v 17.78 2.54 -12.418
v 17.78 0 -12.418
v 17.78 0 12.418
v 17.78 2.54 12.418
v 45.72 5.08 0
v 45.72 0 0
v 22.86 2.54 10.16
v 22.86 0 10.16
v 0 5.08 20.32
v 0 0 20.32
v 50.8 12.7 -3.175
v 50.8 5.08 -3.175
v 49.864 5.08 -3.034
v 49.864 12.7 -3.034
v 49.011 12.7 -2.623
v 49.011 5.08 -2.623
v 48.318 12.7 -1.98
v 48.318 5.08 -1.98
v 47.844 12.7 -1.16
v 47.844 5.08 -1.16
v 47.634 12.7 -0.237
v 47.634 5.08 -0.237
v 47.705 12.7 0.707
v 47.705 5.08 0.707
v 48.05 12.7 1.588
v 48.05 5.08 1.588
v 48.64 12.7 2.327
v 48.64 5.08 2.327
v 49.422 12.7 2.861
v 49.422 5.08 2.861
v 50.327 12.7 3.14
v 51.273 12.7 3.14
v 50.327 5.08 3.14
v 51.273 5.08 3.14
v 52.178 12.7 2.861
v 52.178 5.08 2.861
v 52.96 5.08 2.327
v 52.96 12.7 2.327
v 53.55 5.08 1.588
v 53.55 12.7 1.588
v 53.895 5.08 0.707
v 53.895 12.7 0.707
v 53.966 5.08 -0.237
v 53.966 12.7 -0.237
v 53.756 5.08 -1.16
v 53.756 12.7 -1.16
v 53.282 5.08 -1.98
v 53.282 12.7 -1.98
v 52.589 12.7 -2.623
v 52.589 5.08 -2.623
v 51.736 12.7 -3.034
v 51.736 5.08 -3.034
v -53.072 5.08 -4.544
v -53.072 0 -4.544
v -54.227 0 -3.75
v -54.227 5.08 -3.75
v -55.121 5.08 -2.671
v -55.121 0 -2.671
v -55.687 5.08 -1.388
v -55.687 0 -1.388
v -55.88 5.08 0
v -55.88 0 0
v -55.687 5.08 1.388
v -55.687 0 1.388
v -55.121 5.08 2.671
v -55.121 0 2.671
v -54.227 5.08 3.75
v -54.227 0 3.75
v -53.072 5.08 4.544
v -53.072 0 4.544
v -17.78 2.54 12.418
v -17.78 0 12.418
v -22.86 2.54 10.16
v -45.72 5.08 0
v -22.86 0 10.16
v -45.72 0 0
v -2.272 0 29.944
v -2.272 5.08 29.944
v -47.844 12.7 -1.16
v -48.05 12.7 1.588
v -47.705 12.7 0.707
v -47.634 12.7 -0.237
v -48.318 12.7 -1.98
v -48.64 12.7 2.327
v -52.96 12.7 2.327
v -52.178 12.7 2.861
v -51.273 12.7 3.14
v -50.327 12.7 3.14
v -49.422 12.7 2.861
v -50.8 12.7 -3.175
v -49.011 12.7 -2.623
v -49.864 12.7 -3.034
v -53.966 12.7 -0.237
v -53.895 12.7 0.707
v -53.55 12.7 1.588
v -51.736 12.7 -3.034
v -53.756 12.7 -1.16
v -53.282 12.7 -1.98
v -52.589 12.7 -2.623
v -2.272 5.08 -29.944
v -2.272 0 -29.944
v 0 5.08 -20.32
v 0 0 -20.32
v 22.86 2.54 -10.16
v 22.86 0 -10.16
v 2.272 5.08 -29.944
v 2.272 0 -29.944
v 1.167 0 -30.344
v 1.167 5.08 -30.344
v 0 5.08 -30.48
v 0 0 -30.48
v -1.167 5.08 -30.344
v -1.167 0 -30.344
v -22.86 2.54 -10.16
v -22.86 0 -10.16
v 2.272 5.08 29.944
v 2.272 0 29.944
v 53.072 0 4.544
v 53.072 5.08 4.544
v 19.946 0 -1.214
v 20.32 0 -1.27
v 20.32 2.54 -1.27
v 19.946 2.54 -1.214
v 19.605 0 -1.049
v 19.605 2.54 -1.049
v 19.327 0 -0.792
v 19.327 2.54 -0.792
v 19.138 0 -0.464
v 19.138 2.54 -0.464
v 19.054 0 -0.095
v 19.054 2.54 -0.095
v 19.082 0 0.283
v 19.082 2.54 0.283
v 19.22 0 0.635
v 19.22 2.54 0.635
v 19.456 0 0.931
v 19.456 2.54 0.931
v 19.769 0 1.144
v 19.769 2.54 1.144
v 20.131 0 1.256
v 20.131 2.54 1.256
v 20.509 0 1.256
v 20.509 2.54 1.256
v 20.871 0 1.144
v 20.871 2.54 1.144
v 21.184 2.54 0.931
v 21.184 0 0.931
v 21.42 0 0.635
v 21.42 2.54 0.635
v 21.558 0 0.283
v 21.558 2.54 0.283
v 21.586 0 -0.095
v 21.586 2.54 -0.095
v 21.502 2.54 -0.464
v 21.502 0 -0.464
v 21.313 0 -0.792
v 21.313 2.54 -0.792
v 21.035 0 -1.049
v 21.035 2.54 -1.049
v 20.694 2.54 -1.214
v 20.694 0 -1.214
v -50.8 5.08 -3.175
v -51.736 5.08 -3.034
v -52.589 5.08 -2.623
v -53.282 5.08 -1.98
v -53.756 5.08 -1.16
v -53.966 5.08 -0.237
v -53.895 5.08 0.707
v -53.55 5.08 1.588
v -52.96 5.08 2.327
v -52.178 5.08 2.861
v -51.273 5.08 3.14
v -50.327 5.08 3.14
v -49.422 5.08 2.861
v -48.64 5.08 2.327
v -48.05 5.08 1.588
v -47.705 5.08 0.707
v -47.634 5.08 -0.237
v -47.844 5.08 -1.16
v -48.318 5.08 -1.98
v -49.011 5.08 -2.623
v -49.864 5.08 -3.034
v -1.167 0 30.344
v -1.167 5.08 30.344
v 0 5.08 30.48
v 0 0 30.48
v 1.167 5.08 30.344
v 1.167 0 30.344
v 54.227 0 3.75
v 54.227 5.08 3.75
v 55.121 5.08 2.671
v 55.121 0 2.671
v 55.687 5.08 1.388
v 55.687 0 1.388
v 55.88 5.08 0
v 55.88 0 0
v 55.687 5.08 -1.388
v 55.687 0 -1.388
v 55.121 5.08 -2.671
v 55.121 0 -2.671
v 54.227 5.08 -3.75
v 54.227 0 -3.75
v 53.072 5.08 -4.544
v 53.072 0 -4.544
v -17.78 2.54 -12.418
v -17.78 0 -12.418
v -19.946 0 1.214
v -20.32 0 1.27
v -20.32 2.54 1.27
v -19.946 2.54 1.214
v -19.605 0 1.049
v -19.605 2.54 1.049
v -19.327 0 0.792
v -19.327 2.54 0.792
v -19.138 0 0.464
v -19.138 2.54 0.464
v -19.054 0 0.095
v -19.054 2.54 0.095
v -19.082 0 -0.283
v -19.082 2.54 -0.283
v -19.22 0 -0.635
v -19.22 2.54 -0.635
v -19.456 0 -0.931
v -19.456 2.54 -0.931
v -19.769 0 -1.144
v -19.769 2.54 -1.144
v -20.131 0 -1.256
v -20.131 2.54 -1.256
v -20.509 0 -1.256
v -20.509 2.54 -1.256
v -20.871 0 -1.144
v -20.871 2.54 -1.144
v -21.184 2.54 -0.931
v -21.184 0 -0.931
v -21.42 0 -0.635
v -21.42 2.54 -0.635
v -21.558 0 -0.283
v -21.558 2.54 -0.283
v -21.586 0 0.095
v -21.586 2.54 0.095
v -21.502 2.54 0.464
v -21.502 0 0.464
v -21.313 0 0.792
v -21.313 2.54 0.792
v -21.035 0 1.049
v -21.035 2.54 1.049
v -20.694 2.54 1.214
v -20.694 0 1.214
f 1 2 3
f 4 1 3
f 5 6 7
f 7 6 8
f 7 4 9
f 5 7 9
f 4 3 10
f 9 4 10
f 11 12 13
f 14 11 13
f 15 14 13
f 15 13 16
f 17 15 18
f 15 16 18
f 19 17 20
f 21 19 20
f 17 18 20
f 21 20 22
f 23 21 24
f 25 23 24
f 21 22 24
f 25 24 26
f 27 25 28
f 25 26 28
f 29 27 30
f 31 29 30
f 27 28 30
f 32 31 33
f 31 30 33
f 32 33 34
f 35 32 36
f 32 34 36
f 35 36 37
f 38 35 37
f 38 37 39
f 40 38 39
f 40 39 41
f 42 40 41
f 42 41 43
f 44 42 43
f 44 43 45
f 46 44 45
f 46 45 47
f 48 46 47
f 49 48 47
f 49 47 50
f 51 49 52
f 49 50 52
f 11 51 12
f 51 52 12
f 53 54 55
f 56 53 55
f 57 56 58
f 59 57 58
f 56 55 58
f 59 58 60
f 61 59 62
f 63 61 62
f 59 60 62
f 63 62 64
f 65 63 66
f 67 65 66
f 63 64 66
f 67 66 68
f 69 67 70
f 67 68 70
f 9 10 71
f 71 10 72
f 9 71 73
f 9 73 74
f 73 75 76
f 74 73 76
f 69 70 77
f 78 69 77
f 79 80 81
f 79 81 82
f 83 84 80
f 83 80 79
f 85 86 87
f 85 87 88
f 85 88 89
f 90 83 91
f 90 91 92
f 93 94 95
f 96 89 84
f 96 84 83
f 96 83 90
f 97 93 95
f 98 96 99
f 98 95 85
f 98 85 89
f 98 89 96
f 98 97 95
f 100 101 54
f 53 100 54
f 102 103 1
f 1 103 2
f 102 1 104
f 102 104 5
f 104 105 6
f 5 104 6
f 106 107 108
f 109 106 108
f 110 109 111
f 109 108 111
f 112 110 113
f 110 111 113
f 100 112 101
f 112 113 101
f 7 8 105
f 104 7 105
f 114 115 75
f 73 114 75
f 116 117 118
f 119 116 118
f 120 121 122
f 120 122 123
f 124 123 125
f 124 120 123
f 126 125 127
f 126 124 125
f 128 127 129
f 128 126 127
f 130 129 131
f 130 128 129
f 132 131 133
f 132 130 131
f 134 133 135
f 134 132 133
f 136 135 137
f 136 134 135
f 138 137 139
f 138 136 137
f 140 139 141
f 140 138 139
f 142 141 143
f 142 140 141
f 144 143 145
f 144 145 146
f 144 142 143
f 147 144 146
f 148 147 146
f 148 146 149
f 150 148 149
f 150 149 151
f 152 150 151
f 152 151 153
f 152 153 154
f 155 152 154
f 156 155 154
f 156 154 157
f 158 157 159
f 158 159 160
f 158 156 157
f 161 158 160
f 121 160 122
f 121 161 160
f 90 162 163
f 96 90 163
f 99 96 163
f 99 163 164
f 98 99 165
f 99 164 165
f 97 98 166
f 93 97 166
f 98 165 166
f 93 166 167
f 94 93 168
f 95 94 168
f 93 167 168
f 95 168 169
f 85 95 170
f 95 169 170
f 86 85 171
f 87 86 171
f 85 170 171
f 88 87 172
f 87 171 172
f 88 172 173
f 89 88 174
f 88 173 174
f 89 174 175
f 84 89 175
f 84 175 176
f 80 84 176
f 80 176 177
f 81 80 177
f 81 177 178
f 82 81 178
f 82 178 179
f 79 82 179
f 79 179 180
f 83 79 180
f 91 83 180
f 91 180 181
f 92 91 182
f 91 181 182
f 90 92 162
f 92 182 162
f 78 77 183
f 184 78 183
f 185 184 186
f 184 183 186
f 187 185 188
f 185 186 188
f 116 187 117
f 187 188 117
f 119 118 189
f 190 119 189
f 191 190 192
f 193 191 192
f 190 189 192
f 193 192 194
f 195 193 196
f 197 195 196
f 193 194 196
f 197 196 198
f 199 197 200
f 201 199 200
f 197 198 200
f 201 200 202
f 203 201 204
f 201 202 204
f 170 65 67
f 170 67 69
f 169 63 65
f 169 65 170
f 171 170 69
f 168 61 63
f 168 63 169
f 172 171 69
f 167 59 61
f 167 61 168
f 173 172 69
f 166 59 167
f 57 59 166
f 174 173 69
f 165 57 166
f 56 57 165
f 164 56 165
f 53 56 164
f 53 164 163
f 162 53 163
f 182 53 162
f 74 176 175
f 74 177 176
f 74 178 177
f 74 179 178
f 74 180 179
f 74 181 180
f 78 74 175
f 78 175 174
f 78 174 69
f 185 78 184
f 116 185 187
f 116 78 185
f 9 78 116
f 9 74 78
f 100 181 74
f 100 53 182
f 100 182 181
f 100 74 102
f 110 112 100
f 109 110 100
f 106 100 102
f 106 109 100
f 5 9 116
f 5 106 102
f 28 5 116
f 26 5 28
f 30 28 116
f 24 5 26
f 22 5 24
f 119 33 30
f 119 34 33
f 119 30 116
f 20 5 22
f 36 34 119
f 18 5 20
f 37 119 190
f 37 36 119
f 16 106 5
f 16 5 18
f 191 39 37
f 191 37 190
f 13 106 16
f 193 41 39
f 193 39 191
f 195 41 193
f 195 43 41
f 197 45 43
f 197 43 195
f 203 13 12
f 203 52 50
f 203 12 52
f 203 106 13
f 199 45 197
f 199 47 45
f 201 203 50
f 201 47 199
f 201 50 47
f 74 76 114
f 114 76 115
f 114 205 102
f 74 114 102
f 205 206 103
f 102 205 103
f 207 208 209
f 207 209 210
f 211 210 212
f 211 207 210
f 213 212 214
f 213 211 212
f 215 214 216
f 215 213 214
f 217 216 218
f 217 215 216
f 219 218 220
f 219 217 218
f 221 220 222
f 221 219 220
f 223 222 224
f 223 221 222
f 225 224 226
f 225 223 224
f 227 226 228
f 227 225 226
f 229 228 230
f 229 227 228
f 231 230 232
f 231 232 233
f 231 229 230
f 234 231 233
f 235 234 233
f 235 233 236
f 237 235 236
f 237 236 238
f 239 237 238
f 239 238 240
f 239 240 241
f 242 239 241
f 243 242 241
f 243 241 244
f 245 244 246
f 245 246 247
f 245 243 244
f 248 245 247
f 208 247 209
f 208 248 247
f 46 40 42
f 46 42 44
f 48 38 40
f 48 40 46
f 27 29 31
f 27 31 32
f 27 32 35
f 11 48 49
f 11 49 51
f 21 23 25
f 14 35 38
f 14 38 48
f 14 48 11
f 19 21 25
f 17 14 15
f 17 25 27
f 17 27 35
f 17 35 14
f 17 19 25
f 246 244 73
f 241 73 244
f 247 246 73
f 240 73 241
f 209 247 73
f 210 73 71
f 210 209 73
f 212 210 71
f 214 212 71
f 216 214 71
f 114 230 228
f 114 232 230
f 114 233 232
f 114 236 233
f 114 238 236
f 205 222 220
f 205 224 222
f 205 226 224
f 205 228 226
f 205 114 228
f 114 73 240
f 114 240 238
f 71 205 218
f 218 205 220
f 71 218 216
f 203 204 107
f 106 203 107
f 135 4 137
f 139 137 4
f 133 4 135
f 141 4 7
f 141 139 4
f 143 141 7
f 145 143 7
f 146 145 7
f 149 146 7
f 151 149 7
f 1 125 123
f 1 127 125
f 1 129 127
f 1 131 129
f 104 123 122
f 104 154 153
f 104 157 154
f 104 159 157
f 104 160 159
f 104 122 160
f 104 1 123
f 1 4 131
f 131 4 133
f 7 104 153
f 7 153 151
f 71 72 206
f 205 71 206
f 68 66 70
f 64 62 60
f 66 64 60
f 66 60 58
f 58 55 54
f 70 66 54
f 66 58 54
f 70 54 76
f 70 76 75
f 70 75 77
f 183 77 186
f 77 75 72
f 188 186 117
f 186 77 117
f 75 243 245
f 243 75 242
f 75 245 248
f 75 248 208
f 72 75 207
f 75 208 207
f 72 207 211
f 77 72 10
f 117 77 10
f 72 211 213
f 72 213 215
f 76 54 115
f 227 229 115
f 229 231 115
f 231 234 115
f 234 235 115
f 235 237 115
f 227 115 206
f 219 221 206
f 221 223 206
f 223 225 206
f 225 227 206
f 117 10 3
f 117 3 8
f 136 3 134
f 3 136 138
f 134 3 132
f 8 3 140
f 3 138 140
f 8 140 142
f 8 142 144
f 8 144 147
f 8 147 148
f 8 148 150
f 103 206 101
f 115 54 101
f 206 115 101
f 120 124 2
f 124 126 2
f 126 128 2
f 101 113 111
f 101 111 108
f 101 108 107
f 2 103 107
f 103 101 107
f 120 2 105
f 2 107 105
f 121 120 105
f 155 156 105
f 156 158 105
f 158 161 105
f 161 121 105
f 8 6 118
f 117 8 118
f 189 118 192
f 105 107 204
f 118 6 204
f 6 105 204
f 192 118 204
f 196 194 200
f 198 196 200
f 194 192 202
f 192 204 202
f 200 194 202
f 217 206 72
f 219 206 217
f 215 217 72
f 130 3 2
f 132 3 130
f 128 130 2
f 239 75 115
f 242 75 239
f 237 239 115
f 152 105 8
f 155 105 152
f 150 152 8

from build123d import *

# Parameters (mm, degrees)
SKETCH5_R             = 1.27
BOSS_EXTRUDE2_DEPTH   = 2.54
BOSS_EXTRUDE2_2_DEPTH = 2.54
BOSS_EXTRUDE1_DEPTH   = 5.08
SKETCH6_R             = 3.175
BOSS_EXTRUDE3_DEPTH   = 7.62


with BuildPart() as part:
    # Sketch5 → Boss-Extrude2 (new body)
    with BuildSketch(Plane(origin=(0, 0, 0), x_dir=(1, 0, 0), z_dir=(0, 1, 0))):
        Polygon((-22.86, 10.16), (-22.86, -10.16), (-17.78, -12.417777778), (-17.78, 12.417777778), align=None)
        with Locations(Location((-20.32, 0, 0), (0, 0, 270))):
            Circle(SKETCH5_R, mode=Mode.SUBTRACT)
    extrude(amount=BOSS_EXTRUDE2_DEPTH)



with BuildPart() as body_2:
    # Sketch5 → Boss-Extrude2 2 (new body)
    with BuildSketch(Plane(origin=(0, 0, 0), x_dir=(1, 0, 0), z_dir=(0, 1, 0))):
        Polygon((22.86, 10.16), (17.78, 12.417777778), (17.78, -12.417777778), (22.86, -10.16), align=None)
        with Locations(Location((20.32, 0, 0), (0, 0, 90))):
            Circle(SKETCH5_R, mode=Mode.SUBTRACT)
    extrude(amount=BOSS_EXTRUDE2_2_DEPTH)


with BuildPart() as part_1:
    add(part.part)

    add(body_2.part)  # Boss-Extrude1 merges body 2
    # Sketch2 → Boss-Extrude1 (add)
    with BuildSketch(Plane(origin=(0, 0, 0), x_dir=(1, 0, 0), z_dir=(0, 1, 0))):
        with BuildLine():
            Line((-53.071845065, -4.54369013), (-2.271845065, -29.94369013))
            ThreePointArc((-2.271845065, -29.94369013), (0, -30.48), (2.271845065, -29.94369013))
            Line((2.271845065, -29.94369013), (53.071845065, -4.54369013))
            ThreePointArc((53.071845065, -4.54369013), (55.88, 0), (53.071845065, 4.54369013))
            Line((53.071845065, 4.54369013), (2.271845065, 29.94369013))
            ThreePointArc((2.271845065, 29.94369013), (0, 30.48), (-2.271845065, 29.94369013))
            Line((-2.271845065, 29.94369013), (-53.071845065, 4.54369013))
            ThreePointArc((-53.071845065, 4.54369013), (-55.88, 0), (-53.071845065, -4.54369013))
        make_face()
        Polygon((-45.72, 0), (0, 20.32), (45.72, 0), (0, -20.32), align=None, mode=Mode.SUBTRACT)
    extrude(amount=BOSS_EXTRUDE1_DEPTH)

    # Sketch6 → Boss-Extrude3 (add)
    with BuildSketch(Plane(origin=(0, 5.08, 0), x_dir=(1, 0, 0), z_dir=(0, 1, 0))):
        with Locations(Location((-50.8, 0, 0), (0, 0, 90))):
            Circle(SKETCH6_R)
        with Locations(Location((50.8, 0, 0), (0, 0, 90))):
            Circle(SKETCH6_R)
    extrude(amount=BOSS_EXTRUDE3_DEPTH)


solid = part_1.part
